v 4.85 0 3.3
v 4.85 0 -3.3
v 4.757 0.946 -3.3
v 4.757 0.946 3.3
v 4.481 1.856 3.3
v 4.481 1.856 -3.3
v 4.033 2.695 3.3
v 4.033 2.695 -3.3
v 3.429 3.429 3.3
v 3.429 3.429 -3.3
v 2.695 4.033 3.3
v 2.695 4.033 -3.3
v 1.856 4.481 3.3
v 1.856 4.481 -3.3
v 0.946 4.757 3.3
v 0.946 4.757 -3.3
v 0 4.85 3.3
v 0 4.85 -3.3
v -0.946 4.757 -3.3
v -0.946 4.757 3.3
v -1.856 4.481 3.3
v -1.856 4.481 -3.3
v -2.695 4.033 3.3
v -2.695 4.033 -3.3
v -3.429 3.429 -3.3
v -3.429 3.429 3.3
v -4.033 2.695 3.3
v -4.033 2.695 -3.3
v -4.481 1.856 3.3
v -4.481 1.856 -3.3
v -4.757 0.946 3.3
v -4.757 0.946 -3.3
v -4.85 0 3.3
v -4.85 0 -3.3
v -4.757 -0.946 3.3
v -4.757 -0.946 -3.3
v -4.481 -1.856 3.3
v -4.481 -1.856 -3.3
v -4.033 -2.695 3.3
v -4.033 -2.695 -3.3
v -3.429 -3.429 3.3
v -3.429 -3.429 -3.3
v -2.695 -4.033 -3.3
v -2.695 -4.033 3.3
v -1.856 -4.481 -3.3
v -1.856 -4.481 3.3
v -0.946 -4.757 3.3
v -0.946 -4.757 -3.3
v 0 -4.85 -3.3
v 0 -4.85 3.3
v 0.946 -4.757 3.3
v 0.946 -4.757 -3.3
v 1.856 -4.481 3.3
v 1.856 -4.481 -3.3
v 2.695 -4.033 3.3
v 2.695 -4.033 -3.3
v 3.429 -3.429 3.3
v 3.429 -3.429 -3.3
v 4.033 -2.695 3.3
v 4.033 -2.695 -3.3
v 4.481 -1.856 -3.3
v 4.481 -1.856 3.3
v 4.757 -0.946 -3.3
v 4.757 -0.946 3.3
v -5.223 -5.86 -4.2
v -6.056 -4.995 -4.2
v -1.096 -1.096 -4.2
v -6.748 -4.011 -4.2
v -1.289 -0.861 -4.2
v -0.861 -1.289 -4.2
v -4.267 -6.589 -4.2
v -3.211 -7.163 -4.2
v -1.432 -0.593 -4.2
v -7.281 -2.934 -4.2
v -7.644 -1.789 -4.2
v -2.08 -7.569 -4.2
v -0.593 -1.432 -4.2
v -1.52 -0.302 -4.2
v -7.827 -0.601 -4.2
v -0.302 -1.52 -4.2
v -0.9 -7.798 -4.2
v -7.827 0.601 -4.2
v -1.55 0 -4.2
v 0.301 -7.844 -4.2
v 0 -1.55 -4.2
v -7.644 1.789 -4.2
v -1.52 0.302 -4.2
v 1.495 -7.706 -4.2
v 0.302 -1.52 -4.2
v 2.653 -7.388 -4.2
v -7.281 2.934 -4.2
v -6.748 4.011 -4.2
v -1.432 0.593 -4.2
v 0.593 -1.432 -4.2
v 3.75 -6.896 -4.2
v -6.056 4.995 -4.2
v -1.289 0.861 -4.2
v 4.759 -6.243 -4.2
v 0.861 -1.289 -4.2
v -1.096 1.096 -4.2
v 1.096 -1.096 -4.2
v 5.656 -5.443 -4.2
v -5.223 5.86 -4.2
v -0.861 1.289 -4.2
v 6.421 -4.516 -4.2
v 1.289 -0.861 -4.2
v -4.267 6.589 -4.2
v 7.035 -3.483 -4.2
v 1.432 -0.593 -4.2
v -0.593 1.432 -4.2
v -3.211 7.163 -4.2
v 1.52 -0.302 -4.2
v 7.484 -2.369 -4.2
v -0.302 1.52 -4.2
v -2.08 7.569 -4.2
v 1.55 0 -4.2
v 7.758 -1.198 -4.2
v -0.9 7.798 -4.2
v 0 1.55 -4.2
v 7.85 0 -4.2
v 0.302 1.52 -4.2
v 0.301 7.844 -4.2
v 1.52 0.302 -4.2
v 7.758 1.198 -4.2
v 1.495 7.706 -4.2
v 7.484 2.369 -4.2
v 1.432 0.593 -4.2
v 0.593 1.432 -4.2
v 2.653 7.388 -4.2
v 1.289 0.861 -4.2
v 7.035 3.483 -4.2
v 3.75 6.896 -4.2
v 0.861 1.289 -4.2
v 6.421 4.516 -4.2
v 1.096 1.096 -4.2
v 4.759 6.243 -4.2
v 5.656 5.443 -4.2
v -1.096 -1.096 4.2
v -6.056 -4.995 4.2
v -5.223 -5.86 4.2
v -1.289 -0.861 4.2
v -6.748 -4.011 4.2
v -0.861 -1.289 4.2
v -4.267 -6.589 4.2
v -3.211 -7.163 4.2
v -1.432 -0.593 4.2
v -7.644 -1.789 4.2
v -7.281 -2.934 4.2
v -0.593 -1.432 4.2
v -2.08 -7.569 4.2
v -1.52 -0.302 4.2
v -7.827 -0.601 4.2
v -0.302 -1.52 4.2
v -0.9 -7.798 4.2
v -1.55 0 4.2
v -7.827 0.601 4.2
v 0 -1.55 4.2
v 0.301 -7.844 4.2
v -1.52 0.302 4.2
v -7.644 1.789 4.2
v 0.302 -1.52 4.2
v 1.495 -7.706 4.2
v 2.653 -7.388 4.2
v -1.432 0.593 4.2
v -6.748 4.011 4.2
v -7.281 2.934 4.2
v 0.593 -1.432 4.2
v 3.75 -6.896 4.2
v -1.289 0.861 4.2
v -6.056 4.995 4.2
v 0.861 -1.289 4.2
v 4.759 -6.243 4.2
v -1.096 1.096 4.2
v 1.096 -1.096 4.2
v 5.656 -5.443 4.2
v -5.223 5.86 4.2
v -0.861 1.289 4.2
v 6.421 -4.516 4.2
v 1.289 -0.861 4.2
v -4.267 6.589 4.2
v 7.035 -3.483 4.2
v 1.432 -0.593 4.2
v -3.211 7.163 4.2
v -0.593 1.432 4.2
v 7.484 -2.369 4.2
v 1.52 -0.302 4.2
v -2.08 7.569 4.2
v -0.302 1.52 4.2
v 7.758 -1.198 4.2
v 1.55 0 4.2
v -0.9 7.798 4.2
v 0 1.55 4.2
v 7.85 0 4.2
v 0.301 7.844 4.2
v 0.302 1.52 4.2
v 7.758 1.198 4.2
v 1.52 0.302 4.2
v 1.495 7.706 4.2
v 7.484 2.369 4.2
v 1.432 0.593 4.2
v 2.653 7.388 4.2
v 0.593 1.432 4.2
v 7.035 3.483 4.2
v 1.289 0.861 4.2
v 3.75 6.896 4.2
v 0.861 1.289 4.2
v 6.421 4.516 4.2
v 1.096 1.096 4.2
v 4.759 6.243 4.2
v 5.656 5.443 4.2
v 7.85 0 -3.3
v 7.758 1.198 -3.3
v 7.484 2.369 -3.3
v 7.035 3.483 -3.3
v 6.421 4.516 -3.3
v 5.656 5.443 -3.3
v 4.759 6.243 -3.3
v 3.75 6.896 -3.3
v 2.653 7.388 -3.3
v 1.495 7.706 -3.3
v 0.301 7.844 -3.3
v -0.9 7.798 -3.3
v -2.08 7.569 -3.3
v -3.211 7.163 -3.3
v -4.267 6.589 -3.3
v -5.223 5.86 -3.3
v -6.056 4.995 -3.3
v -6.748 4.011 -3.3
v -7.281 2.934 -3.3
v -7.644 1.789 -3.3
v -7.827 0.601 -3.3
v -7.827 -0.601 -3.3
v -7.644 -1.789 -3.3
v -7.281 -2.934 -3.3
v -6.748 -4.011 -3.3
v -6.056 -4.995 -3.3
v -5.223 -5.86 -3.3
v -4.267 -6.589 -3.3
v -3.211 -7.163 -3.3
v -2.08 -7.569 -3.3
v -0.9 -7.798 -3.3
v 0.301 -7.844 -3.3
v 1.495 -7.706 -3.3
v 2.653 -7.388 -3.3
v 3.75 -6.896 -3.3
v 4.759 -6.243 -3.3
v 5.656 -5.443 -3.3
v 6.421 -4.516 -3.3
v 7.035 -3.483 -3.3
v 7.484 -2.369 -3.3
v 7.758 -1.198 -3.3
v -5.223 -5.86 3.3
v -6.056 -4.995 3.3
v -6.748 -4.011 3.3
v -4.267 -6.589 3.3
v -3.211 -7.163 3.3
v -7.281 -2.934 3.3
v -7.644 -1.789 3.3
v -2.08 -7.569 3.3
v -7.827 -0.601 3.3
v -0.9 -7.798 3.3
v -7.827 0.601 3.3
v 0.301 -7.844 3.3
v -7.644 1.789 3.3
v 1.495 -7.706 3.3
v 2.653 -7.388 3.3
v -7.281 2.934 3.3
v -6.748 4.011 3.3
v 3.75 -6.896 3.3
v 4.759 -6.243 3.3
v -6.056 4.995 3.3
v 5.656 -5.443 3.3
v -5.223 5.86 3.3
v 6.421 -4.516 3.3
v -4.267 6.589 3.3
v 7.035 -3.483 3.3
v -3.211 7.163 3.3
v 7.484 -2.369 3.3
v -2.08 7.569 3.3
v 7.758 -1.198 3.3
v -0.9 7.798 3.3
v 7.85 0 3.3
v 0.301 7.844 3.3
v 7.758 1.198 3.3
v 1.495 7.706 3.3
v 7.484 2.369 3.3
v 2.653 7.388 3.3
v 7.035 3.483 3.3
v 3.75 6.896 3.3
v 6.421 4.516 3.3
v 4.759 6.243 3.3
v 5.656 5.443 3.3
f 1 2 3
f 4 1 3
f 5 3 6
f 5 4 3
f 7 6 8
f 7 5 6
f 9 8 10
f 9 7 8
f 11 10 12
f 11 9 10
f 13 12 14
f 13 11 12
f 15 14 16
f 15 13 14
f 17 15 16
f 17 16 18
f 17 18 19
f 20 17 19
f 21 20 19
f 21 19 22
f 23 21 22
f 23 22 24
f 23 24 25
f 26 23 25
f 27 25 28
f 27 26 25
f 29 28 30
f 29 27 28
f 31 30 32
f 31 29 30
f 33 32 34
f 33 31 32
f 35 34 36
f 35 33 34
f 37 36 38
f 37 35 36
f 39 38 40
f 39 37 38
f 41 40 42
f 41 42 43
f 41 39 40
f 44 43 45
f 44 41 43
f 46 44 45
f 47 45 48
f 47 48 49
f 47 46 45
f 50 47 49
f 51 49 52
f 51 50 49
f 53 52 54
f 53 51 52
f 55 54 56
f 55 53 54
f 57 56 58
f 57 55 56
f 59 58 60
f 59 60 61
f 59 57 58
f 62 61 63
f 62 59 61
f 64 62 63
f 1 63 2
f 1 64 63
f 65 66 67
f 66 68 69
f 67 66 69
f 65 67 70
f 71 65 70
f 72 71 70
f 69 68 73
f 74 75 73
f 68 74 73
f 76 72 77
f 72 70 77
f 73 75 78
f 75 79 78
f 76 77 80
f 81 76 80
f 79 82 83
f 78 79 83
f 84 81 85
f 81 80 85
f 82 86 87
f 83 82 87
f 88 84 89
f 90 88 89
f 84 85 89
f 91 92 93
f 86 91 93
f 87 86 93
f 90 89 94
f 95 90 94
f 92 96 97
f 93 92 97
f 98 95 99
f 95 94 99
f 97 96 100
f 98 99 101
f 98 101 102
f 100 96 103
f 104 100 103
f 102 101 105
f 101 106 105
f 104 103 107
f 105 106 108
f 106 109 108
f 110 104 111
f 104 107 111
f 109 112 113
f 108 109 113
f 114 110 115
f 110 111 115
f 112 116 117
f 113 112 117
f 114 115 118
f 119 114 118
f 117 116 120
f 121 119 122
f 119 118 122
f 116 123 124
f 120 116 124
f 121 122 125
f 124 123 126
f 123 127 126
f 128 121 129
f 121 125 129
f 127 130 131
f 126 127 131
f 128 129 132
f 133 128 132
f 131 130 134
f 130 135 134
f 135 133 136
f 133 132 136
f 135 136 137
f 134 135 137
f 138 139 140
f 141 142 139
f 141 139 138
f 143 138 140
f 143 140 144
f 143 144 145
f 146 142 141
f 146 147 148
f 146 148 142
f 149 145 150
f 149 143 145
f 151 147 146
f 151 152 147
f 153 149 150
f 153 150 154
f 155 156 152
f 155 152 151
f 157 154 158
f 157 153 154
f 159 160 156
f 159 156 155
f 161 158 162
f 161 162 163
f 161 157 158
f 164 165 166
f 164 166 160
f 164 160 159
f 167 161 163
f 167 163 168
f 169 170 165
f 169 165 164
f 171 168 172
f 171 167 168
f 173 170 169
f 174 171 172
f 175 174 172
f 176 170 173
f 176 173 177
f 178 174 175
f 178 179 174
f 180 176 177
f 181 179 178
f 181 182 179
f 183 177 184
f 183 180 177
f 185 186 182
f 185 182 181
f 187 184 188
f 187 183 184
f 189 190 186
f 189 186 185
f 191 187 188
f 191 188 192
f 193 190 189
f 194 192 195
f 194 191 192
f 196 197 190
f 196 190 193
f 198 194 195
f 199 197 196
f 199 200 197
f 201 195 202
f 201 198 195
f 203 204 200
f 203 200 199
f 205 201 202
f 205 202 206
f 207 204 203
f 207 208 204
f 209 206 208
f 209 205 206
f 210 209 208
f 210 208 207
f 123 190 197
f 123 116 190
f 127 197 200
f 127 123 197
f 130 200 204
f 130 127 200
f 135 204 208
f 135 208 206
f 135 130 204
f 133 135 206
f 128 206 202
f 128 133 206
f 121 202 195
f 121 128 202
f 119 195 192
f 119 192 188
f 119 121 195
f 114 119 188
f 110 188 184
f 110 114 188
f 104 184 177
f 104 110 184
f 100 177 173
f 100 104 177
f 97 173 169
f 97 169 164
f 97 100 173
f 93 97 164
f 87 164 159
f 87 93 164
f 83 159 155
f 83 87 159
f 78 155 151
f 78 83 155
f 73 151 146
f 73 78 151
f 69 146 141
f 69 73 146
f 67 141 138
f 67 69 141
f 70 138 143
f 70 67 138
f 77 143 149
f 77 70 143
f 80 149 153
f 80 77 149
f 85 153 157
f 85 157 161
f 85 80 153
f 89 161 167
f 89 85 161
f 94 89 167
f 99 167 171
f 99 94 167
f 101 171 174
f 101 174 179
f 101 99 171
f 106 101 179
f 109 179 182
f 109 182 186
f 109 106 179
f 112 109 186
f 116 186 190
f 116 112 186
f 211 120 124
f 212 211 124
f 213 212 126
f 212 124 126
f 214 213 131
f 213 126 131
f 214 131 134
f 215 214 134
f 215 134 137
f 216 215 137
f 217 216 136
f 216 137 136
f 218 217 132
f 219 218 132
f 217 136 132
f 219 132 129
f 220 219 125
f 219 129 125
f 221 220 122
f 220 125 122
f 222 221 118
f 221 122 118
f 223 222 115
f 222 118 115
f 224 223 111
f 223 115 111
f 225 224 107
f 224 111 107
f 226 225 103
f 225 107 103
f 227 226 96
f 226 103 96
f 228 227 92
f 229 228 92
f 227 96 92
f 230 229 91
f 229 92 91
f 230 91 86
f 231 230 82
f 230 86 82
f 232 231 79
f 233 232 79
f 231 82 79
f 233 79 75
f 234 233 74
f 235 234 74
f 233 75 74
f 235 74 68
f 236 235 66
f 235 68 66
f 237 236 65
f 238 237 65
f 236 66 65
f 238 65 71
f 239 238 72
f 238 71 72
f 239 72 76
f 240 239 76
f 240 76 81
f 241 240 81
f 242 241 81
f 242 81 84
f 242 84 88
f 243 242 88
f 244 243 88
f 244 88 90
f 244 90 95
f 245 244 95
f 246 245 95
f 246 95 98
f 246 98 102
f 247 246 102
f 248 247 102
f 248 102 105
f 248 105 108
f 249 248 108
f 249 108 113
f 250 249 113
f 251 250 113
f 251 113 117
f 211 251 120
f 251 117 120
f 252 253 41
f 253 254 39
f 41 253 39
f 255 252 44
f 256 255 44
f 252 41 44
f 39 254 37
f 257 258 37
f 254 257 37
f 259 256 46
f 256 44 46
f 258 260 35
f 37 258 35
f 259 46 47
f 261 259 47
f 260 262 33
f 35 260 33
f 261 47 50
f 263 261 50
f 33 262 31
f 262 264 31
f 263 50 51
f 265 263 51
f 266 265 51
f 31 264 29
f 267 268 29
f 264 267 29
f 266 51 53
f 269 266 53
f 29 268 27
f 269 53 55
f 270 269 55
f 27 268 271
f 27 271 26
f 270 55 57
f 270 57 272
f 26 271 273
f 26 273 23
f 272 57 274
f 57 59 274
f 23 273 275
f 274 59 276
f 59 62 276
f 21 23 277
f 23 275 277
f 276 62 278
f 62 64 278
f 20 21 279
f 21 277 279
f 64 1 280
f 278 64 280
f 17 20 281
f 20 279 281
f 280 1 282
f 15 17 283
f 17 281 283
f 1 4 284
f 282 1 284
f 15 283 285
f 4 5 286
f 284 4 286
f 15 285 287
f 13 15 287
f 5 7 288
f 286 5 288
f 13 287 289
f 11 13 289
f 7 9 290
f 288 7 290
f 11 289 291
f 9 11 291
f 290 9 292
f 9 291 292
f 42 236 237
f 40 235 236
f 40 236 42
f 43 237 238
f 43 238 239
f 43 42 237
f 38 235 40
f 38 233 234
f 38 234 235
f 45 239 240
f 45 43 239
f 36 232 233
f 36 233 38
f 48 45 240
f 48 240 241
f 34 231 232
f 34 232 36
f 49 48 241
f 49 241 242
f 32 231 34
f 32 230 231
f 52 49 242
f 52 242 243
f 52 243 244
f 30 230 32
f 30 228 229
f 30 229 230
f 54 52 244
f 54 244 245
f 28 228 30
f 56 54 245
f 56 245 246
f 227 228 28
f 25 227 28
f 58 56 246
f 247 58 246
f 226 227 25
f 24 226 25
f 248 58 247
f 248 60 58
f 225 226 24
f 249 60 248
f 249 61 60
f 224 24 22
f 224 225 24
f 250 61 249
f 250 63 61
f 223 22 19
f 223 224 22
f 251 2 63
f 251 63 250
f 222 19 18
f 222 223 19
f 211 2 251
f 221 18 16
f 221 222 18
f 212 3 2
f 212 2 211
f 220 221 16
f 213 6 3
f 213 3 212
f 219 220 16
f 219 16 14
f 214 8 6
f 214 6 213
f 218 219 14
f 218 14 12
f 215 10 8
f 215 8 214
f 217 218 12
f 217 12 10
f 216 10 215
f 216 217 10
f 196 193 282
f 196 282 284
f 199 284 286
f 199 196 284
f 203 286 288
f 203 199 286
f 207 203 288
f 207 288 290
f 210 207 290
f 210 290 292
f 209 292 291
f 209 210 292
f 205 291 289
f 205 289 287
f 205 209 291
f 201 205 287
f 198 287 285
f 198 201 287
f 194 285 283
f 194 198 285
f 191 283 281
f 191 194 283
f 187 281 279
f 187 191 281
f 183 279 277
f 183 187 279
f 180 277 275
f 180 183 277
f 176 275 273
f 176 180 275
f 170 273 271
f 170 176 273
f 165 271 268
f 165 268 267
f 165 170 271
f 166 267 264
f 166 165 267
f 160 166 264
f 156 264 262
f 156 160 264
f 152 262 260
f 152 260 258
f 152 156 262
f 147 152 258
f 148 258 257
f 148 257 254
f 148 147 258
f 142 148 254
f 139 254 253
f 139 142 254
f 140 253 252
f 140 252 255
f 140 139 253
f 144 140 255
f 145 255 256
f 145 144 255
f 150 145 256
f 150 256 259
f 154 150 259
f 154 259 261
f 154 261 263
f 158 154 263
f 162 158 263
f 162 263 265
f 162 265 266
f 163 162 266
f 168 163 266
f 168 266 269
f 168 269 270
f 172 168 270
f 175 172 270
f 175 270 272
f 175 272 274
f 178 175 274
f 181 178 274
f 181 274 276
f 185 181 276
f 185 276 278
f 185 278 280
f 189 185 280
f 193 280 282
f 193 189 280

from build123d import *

# Parameters (mm, degrees)
SKETCH1_R           = 4.85
SKETCH1_R_2         = 1.55
BOSS_EXTRUDE1_DEPTH = 4.2
BOSS_EXTRUDE2_START = 4.2
SKETCH1_3_R         = 7.85
SKETCH1_3_R_2       = 4.85
BOSS_EXTRUDE2_DEPTH = 0.9
BOSS_EXTRUDE3_START = -4.2
SKETCH1_4_R         = 7.85
SKETCH1_4_R_2       = 4.85
BOSS_EXTRUDE3_DEPTH = 0.9


with BuildPart() as part:
    # Sketch1 → Boss-Extrude1 (new body, symmetric)
    with BuildSketch(Plane.XY):
        Circle(SKETCH1_R)
        Circle(SKETCH1_R_2, mode=Mode.SUBTRACT)
    extrude(amount=BOSS_EXTRUDE1_DEPTH, both=True)

    # Sketch1<3> → Boss-Extrude2 (add)
    with BuildSketch(Plane.XY.offset(BOSS_EXTRUDE2_START)):
        Circle(SKETCH1_3_R)
        Circle(SKETCH1_3_R_2, mode=Mode.SUBTRACT)
    extrude(amount=-BOSS_EXTRUDE2_DEPTH)

    # Sketch1<4> → Boss-Extrude3 (add)
    with BuildSketch(Plane.XY.offset(BOSS_EXTRUDE3_START)):
        Circle(SKETCH1_4_R)
        Circle(SKETCH1_4_R_2, mode=Mode.SUBTRACT)
    extrude(amount=BOSS_EXTRUDE3_DEPTH)


solid = part.part
